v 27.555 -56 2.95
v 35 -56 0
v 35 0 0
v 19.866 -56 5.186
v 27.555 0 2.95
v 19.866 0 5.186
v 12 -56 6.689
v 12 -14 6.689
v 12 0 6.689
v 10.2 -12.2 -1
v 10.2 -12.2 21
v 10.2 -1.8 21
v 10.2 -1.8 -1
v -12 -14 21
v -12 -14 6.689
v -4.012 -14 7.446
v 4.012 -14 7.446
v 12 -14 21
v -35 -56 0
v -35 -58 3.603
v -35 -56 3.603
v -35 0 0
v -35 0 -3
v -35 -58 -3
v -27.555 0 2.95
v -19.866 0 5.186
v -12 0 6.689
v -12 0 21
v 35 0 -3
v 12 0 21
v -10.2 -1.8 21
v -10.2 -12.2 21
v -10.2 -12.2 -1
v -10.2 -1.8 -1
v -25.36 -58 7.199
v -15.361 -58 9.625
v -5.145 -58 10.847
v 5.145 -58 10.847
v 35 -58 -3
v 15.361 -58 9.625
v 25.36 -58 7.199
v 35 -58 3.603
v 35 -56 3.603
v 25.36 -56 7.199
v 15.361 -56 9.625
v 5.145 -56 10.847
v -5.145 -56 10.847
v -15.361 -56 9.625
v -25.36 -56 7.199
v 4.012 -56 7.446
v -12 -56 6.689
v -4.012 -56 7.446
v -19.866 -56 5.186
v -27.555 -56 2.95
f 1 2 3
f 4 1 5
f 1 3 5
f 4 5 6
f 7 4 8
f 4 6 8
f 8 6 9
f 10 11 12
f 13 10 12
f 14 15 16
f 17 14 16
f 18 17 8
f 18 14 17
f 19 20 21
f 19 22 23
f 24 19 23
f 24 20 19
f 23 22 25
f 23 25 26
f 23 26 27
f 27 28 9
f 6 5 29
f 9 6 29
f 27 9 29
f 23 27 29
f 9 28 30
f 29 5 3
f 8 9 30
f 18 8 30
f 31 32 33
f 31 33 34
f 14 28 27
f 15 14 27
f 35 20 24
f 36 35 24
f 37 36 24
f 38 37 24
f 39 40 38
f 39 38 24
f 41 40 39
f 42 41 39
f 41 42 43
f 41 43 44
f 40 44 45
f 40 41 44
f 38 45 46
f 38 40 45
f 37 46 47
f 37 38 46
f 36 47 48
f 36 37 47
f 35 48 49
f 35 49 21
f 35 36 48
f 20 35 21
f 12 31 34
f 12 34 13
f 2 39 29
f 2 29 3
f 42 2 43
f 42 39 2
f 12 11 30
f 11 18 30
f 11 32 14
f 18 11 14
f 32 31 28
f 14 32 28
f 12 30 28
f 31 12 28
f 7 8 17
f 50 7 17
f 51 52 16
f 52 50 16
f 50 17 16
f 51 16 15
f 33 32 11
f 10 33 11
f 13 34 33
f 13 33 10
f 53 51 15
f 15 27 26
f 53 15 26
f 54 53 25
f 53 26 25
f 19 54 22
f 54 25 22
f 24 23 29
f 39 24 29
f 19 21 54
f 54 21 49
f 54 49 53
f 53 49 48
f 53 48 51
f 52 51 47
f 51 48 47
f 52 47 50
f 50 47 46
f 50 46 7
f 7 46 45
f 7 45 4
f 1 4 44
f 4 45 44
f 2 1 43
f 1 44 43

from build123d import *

# Parameters (mm, degrees)
F1_DEPTH = 58
F2_DEPTH = 14
F4_DEPTH = 2
F5_W     = 20.4
F5_H     = 10.4
F6_DEPTH = 22


with BuildPart() as f1:
    # F0 (on Front) → F1 (new body)
    with BuildSketch(Plane.XZ):
        with BuildLine():
            Line((35, -3), (35, 0))
            ThreePointArc((35, 0), (23.7368009031, 4.158739596), (12, 6.6890110215))
            Line((12, 6.6890110215), (12, 0))
            Line((12, 0), (-12, 0))
            Line((-12, 0), (-12, 6.6890110215))
            ThreePointArc((-12, 6.6890110215), (-23.7368009031, 4.158739596), (-35, 0))
            Line((-35, 0), (-35, -3))
            Line((-35, -3), (35, -3))
        make_face()
        with BuildLine():
            Line((12, 0), (12, 6.6890110215))
            ThreePointArc((12, 6.6890110215), (0, 7.5403330759), (-12, 6.6890110215))
            Line((-12, 6.6890110215), (-12, 0))
            Line((-12, 0), (12, 0))
        make_face()
    extrude(amount=F1_DEPTH)

    # F0 (on Front) → F2 (join)
    with BuildSketch(Plane.XZ):
        with BuildLine():
            ThreePointArc((-12, 6.6890110215), (0, 7.5403330759), (12, 6.6890110215))
            Line((12, 6.6890110215), (12, 21))
            Line((12, 21), (-12, 21))
            Line((-12, 21), (-12, 6.6890110215))
        make_face()
    extrude(amount=F2_DEPTH)

    # F3 (on face) → F4 (join)
    with BuildSketch(Plane.XZ.offset(58)):
        with BuildLine():
            Line((35, 0), (35, 3.6027812406))
            ThreePointArc((35, 3.6027812406), (0, 11), (-35, 3.6027812406))
            Line((-35, 3.6027812406), (-35, 0))
            ThreePointArc((-35, 0), (0, 7.5403330759), (35, 0))
        make_face()
    extrude(amount=-F4_DEPTH)

    # F5 (on face) → F6 (cut)
    with BuildSketch(Plane.XY.offset(21)):
        with Locations((0, -7)):
            Rectangle(F5_W, F5_H)
    extrude(amount=-F6_DEPTH, mode=Mode.SUBTRACT)


solid = f1.part
